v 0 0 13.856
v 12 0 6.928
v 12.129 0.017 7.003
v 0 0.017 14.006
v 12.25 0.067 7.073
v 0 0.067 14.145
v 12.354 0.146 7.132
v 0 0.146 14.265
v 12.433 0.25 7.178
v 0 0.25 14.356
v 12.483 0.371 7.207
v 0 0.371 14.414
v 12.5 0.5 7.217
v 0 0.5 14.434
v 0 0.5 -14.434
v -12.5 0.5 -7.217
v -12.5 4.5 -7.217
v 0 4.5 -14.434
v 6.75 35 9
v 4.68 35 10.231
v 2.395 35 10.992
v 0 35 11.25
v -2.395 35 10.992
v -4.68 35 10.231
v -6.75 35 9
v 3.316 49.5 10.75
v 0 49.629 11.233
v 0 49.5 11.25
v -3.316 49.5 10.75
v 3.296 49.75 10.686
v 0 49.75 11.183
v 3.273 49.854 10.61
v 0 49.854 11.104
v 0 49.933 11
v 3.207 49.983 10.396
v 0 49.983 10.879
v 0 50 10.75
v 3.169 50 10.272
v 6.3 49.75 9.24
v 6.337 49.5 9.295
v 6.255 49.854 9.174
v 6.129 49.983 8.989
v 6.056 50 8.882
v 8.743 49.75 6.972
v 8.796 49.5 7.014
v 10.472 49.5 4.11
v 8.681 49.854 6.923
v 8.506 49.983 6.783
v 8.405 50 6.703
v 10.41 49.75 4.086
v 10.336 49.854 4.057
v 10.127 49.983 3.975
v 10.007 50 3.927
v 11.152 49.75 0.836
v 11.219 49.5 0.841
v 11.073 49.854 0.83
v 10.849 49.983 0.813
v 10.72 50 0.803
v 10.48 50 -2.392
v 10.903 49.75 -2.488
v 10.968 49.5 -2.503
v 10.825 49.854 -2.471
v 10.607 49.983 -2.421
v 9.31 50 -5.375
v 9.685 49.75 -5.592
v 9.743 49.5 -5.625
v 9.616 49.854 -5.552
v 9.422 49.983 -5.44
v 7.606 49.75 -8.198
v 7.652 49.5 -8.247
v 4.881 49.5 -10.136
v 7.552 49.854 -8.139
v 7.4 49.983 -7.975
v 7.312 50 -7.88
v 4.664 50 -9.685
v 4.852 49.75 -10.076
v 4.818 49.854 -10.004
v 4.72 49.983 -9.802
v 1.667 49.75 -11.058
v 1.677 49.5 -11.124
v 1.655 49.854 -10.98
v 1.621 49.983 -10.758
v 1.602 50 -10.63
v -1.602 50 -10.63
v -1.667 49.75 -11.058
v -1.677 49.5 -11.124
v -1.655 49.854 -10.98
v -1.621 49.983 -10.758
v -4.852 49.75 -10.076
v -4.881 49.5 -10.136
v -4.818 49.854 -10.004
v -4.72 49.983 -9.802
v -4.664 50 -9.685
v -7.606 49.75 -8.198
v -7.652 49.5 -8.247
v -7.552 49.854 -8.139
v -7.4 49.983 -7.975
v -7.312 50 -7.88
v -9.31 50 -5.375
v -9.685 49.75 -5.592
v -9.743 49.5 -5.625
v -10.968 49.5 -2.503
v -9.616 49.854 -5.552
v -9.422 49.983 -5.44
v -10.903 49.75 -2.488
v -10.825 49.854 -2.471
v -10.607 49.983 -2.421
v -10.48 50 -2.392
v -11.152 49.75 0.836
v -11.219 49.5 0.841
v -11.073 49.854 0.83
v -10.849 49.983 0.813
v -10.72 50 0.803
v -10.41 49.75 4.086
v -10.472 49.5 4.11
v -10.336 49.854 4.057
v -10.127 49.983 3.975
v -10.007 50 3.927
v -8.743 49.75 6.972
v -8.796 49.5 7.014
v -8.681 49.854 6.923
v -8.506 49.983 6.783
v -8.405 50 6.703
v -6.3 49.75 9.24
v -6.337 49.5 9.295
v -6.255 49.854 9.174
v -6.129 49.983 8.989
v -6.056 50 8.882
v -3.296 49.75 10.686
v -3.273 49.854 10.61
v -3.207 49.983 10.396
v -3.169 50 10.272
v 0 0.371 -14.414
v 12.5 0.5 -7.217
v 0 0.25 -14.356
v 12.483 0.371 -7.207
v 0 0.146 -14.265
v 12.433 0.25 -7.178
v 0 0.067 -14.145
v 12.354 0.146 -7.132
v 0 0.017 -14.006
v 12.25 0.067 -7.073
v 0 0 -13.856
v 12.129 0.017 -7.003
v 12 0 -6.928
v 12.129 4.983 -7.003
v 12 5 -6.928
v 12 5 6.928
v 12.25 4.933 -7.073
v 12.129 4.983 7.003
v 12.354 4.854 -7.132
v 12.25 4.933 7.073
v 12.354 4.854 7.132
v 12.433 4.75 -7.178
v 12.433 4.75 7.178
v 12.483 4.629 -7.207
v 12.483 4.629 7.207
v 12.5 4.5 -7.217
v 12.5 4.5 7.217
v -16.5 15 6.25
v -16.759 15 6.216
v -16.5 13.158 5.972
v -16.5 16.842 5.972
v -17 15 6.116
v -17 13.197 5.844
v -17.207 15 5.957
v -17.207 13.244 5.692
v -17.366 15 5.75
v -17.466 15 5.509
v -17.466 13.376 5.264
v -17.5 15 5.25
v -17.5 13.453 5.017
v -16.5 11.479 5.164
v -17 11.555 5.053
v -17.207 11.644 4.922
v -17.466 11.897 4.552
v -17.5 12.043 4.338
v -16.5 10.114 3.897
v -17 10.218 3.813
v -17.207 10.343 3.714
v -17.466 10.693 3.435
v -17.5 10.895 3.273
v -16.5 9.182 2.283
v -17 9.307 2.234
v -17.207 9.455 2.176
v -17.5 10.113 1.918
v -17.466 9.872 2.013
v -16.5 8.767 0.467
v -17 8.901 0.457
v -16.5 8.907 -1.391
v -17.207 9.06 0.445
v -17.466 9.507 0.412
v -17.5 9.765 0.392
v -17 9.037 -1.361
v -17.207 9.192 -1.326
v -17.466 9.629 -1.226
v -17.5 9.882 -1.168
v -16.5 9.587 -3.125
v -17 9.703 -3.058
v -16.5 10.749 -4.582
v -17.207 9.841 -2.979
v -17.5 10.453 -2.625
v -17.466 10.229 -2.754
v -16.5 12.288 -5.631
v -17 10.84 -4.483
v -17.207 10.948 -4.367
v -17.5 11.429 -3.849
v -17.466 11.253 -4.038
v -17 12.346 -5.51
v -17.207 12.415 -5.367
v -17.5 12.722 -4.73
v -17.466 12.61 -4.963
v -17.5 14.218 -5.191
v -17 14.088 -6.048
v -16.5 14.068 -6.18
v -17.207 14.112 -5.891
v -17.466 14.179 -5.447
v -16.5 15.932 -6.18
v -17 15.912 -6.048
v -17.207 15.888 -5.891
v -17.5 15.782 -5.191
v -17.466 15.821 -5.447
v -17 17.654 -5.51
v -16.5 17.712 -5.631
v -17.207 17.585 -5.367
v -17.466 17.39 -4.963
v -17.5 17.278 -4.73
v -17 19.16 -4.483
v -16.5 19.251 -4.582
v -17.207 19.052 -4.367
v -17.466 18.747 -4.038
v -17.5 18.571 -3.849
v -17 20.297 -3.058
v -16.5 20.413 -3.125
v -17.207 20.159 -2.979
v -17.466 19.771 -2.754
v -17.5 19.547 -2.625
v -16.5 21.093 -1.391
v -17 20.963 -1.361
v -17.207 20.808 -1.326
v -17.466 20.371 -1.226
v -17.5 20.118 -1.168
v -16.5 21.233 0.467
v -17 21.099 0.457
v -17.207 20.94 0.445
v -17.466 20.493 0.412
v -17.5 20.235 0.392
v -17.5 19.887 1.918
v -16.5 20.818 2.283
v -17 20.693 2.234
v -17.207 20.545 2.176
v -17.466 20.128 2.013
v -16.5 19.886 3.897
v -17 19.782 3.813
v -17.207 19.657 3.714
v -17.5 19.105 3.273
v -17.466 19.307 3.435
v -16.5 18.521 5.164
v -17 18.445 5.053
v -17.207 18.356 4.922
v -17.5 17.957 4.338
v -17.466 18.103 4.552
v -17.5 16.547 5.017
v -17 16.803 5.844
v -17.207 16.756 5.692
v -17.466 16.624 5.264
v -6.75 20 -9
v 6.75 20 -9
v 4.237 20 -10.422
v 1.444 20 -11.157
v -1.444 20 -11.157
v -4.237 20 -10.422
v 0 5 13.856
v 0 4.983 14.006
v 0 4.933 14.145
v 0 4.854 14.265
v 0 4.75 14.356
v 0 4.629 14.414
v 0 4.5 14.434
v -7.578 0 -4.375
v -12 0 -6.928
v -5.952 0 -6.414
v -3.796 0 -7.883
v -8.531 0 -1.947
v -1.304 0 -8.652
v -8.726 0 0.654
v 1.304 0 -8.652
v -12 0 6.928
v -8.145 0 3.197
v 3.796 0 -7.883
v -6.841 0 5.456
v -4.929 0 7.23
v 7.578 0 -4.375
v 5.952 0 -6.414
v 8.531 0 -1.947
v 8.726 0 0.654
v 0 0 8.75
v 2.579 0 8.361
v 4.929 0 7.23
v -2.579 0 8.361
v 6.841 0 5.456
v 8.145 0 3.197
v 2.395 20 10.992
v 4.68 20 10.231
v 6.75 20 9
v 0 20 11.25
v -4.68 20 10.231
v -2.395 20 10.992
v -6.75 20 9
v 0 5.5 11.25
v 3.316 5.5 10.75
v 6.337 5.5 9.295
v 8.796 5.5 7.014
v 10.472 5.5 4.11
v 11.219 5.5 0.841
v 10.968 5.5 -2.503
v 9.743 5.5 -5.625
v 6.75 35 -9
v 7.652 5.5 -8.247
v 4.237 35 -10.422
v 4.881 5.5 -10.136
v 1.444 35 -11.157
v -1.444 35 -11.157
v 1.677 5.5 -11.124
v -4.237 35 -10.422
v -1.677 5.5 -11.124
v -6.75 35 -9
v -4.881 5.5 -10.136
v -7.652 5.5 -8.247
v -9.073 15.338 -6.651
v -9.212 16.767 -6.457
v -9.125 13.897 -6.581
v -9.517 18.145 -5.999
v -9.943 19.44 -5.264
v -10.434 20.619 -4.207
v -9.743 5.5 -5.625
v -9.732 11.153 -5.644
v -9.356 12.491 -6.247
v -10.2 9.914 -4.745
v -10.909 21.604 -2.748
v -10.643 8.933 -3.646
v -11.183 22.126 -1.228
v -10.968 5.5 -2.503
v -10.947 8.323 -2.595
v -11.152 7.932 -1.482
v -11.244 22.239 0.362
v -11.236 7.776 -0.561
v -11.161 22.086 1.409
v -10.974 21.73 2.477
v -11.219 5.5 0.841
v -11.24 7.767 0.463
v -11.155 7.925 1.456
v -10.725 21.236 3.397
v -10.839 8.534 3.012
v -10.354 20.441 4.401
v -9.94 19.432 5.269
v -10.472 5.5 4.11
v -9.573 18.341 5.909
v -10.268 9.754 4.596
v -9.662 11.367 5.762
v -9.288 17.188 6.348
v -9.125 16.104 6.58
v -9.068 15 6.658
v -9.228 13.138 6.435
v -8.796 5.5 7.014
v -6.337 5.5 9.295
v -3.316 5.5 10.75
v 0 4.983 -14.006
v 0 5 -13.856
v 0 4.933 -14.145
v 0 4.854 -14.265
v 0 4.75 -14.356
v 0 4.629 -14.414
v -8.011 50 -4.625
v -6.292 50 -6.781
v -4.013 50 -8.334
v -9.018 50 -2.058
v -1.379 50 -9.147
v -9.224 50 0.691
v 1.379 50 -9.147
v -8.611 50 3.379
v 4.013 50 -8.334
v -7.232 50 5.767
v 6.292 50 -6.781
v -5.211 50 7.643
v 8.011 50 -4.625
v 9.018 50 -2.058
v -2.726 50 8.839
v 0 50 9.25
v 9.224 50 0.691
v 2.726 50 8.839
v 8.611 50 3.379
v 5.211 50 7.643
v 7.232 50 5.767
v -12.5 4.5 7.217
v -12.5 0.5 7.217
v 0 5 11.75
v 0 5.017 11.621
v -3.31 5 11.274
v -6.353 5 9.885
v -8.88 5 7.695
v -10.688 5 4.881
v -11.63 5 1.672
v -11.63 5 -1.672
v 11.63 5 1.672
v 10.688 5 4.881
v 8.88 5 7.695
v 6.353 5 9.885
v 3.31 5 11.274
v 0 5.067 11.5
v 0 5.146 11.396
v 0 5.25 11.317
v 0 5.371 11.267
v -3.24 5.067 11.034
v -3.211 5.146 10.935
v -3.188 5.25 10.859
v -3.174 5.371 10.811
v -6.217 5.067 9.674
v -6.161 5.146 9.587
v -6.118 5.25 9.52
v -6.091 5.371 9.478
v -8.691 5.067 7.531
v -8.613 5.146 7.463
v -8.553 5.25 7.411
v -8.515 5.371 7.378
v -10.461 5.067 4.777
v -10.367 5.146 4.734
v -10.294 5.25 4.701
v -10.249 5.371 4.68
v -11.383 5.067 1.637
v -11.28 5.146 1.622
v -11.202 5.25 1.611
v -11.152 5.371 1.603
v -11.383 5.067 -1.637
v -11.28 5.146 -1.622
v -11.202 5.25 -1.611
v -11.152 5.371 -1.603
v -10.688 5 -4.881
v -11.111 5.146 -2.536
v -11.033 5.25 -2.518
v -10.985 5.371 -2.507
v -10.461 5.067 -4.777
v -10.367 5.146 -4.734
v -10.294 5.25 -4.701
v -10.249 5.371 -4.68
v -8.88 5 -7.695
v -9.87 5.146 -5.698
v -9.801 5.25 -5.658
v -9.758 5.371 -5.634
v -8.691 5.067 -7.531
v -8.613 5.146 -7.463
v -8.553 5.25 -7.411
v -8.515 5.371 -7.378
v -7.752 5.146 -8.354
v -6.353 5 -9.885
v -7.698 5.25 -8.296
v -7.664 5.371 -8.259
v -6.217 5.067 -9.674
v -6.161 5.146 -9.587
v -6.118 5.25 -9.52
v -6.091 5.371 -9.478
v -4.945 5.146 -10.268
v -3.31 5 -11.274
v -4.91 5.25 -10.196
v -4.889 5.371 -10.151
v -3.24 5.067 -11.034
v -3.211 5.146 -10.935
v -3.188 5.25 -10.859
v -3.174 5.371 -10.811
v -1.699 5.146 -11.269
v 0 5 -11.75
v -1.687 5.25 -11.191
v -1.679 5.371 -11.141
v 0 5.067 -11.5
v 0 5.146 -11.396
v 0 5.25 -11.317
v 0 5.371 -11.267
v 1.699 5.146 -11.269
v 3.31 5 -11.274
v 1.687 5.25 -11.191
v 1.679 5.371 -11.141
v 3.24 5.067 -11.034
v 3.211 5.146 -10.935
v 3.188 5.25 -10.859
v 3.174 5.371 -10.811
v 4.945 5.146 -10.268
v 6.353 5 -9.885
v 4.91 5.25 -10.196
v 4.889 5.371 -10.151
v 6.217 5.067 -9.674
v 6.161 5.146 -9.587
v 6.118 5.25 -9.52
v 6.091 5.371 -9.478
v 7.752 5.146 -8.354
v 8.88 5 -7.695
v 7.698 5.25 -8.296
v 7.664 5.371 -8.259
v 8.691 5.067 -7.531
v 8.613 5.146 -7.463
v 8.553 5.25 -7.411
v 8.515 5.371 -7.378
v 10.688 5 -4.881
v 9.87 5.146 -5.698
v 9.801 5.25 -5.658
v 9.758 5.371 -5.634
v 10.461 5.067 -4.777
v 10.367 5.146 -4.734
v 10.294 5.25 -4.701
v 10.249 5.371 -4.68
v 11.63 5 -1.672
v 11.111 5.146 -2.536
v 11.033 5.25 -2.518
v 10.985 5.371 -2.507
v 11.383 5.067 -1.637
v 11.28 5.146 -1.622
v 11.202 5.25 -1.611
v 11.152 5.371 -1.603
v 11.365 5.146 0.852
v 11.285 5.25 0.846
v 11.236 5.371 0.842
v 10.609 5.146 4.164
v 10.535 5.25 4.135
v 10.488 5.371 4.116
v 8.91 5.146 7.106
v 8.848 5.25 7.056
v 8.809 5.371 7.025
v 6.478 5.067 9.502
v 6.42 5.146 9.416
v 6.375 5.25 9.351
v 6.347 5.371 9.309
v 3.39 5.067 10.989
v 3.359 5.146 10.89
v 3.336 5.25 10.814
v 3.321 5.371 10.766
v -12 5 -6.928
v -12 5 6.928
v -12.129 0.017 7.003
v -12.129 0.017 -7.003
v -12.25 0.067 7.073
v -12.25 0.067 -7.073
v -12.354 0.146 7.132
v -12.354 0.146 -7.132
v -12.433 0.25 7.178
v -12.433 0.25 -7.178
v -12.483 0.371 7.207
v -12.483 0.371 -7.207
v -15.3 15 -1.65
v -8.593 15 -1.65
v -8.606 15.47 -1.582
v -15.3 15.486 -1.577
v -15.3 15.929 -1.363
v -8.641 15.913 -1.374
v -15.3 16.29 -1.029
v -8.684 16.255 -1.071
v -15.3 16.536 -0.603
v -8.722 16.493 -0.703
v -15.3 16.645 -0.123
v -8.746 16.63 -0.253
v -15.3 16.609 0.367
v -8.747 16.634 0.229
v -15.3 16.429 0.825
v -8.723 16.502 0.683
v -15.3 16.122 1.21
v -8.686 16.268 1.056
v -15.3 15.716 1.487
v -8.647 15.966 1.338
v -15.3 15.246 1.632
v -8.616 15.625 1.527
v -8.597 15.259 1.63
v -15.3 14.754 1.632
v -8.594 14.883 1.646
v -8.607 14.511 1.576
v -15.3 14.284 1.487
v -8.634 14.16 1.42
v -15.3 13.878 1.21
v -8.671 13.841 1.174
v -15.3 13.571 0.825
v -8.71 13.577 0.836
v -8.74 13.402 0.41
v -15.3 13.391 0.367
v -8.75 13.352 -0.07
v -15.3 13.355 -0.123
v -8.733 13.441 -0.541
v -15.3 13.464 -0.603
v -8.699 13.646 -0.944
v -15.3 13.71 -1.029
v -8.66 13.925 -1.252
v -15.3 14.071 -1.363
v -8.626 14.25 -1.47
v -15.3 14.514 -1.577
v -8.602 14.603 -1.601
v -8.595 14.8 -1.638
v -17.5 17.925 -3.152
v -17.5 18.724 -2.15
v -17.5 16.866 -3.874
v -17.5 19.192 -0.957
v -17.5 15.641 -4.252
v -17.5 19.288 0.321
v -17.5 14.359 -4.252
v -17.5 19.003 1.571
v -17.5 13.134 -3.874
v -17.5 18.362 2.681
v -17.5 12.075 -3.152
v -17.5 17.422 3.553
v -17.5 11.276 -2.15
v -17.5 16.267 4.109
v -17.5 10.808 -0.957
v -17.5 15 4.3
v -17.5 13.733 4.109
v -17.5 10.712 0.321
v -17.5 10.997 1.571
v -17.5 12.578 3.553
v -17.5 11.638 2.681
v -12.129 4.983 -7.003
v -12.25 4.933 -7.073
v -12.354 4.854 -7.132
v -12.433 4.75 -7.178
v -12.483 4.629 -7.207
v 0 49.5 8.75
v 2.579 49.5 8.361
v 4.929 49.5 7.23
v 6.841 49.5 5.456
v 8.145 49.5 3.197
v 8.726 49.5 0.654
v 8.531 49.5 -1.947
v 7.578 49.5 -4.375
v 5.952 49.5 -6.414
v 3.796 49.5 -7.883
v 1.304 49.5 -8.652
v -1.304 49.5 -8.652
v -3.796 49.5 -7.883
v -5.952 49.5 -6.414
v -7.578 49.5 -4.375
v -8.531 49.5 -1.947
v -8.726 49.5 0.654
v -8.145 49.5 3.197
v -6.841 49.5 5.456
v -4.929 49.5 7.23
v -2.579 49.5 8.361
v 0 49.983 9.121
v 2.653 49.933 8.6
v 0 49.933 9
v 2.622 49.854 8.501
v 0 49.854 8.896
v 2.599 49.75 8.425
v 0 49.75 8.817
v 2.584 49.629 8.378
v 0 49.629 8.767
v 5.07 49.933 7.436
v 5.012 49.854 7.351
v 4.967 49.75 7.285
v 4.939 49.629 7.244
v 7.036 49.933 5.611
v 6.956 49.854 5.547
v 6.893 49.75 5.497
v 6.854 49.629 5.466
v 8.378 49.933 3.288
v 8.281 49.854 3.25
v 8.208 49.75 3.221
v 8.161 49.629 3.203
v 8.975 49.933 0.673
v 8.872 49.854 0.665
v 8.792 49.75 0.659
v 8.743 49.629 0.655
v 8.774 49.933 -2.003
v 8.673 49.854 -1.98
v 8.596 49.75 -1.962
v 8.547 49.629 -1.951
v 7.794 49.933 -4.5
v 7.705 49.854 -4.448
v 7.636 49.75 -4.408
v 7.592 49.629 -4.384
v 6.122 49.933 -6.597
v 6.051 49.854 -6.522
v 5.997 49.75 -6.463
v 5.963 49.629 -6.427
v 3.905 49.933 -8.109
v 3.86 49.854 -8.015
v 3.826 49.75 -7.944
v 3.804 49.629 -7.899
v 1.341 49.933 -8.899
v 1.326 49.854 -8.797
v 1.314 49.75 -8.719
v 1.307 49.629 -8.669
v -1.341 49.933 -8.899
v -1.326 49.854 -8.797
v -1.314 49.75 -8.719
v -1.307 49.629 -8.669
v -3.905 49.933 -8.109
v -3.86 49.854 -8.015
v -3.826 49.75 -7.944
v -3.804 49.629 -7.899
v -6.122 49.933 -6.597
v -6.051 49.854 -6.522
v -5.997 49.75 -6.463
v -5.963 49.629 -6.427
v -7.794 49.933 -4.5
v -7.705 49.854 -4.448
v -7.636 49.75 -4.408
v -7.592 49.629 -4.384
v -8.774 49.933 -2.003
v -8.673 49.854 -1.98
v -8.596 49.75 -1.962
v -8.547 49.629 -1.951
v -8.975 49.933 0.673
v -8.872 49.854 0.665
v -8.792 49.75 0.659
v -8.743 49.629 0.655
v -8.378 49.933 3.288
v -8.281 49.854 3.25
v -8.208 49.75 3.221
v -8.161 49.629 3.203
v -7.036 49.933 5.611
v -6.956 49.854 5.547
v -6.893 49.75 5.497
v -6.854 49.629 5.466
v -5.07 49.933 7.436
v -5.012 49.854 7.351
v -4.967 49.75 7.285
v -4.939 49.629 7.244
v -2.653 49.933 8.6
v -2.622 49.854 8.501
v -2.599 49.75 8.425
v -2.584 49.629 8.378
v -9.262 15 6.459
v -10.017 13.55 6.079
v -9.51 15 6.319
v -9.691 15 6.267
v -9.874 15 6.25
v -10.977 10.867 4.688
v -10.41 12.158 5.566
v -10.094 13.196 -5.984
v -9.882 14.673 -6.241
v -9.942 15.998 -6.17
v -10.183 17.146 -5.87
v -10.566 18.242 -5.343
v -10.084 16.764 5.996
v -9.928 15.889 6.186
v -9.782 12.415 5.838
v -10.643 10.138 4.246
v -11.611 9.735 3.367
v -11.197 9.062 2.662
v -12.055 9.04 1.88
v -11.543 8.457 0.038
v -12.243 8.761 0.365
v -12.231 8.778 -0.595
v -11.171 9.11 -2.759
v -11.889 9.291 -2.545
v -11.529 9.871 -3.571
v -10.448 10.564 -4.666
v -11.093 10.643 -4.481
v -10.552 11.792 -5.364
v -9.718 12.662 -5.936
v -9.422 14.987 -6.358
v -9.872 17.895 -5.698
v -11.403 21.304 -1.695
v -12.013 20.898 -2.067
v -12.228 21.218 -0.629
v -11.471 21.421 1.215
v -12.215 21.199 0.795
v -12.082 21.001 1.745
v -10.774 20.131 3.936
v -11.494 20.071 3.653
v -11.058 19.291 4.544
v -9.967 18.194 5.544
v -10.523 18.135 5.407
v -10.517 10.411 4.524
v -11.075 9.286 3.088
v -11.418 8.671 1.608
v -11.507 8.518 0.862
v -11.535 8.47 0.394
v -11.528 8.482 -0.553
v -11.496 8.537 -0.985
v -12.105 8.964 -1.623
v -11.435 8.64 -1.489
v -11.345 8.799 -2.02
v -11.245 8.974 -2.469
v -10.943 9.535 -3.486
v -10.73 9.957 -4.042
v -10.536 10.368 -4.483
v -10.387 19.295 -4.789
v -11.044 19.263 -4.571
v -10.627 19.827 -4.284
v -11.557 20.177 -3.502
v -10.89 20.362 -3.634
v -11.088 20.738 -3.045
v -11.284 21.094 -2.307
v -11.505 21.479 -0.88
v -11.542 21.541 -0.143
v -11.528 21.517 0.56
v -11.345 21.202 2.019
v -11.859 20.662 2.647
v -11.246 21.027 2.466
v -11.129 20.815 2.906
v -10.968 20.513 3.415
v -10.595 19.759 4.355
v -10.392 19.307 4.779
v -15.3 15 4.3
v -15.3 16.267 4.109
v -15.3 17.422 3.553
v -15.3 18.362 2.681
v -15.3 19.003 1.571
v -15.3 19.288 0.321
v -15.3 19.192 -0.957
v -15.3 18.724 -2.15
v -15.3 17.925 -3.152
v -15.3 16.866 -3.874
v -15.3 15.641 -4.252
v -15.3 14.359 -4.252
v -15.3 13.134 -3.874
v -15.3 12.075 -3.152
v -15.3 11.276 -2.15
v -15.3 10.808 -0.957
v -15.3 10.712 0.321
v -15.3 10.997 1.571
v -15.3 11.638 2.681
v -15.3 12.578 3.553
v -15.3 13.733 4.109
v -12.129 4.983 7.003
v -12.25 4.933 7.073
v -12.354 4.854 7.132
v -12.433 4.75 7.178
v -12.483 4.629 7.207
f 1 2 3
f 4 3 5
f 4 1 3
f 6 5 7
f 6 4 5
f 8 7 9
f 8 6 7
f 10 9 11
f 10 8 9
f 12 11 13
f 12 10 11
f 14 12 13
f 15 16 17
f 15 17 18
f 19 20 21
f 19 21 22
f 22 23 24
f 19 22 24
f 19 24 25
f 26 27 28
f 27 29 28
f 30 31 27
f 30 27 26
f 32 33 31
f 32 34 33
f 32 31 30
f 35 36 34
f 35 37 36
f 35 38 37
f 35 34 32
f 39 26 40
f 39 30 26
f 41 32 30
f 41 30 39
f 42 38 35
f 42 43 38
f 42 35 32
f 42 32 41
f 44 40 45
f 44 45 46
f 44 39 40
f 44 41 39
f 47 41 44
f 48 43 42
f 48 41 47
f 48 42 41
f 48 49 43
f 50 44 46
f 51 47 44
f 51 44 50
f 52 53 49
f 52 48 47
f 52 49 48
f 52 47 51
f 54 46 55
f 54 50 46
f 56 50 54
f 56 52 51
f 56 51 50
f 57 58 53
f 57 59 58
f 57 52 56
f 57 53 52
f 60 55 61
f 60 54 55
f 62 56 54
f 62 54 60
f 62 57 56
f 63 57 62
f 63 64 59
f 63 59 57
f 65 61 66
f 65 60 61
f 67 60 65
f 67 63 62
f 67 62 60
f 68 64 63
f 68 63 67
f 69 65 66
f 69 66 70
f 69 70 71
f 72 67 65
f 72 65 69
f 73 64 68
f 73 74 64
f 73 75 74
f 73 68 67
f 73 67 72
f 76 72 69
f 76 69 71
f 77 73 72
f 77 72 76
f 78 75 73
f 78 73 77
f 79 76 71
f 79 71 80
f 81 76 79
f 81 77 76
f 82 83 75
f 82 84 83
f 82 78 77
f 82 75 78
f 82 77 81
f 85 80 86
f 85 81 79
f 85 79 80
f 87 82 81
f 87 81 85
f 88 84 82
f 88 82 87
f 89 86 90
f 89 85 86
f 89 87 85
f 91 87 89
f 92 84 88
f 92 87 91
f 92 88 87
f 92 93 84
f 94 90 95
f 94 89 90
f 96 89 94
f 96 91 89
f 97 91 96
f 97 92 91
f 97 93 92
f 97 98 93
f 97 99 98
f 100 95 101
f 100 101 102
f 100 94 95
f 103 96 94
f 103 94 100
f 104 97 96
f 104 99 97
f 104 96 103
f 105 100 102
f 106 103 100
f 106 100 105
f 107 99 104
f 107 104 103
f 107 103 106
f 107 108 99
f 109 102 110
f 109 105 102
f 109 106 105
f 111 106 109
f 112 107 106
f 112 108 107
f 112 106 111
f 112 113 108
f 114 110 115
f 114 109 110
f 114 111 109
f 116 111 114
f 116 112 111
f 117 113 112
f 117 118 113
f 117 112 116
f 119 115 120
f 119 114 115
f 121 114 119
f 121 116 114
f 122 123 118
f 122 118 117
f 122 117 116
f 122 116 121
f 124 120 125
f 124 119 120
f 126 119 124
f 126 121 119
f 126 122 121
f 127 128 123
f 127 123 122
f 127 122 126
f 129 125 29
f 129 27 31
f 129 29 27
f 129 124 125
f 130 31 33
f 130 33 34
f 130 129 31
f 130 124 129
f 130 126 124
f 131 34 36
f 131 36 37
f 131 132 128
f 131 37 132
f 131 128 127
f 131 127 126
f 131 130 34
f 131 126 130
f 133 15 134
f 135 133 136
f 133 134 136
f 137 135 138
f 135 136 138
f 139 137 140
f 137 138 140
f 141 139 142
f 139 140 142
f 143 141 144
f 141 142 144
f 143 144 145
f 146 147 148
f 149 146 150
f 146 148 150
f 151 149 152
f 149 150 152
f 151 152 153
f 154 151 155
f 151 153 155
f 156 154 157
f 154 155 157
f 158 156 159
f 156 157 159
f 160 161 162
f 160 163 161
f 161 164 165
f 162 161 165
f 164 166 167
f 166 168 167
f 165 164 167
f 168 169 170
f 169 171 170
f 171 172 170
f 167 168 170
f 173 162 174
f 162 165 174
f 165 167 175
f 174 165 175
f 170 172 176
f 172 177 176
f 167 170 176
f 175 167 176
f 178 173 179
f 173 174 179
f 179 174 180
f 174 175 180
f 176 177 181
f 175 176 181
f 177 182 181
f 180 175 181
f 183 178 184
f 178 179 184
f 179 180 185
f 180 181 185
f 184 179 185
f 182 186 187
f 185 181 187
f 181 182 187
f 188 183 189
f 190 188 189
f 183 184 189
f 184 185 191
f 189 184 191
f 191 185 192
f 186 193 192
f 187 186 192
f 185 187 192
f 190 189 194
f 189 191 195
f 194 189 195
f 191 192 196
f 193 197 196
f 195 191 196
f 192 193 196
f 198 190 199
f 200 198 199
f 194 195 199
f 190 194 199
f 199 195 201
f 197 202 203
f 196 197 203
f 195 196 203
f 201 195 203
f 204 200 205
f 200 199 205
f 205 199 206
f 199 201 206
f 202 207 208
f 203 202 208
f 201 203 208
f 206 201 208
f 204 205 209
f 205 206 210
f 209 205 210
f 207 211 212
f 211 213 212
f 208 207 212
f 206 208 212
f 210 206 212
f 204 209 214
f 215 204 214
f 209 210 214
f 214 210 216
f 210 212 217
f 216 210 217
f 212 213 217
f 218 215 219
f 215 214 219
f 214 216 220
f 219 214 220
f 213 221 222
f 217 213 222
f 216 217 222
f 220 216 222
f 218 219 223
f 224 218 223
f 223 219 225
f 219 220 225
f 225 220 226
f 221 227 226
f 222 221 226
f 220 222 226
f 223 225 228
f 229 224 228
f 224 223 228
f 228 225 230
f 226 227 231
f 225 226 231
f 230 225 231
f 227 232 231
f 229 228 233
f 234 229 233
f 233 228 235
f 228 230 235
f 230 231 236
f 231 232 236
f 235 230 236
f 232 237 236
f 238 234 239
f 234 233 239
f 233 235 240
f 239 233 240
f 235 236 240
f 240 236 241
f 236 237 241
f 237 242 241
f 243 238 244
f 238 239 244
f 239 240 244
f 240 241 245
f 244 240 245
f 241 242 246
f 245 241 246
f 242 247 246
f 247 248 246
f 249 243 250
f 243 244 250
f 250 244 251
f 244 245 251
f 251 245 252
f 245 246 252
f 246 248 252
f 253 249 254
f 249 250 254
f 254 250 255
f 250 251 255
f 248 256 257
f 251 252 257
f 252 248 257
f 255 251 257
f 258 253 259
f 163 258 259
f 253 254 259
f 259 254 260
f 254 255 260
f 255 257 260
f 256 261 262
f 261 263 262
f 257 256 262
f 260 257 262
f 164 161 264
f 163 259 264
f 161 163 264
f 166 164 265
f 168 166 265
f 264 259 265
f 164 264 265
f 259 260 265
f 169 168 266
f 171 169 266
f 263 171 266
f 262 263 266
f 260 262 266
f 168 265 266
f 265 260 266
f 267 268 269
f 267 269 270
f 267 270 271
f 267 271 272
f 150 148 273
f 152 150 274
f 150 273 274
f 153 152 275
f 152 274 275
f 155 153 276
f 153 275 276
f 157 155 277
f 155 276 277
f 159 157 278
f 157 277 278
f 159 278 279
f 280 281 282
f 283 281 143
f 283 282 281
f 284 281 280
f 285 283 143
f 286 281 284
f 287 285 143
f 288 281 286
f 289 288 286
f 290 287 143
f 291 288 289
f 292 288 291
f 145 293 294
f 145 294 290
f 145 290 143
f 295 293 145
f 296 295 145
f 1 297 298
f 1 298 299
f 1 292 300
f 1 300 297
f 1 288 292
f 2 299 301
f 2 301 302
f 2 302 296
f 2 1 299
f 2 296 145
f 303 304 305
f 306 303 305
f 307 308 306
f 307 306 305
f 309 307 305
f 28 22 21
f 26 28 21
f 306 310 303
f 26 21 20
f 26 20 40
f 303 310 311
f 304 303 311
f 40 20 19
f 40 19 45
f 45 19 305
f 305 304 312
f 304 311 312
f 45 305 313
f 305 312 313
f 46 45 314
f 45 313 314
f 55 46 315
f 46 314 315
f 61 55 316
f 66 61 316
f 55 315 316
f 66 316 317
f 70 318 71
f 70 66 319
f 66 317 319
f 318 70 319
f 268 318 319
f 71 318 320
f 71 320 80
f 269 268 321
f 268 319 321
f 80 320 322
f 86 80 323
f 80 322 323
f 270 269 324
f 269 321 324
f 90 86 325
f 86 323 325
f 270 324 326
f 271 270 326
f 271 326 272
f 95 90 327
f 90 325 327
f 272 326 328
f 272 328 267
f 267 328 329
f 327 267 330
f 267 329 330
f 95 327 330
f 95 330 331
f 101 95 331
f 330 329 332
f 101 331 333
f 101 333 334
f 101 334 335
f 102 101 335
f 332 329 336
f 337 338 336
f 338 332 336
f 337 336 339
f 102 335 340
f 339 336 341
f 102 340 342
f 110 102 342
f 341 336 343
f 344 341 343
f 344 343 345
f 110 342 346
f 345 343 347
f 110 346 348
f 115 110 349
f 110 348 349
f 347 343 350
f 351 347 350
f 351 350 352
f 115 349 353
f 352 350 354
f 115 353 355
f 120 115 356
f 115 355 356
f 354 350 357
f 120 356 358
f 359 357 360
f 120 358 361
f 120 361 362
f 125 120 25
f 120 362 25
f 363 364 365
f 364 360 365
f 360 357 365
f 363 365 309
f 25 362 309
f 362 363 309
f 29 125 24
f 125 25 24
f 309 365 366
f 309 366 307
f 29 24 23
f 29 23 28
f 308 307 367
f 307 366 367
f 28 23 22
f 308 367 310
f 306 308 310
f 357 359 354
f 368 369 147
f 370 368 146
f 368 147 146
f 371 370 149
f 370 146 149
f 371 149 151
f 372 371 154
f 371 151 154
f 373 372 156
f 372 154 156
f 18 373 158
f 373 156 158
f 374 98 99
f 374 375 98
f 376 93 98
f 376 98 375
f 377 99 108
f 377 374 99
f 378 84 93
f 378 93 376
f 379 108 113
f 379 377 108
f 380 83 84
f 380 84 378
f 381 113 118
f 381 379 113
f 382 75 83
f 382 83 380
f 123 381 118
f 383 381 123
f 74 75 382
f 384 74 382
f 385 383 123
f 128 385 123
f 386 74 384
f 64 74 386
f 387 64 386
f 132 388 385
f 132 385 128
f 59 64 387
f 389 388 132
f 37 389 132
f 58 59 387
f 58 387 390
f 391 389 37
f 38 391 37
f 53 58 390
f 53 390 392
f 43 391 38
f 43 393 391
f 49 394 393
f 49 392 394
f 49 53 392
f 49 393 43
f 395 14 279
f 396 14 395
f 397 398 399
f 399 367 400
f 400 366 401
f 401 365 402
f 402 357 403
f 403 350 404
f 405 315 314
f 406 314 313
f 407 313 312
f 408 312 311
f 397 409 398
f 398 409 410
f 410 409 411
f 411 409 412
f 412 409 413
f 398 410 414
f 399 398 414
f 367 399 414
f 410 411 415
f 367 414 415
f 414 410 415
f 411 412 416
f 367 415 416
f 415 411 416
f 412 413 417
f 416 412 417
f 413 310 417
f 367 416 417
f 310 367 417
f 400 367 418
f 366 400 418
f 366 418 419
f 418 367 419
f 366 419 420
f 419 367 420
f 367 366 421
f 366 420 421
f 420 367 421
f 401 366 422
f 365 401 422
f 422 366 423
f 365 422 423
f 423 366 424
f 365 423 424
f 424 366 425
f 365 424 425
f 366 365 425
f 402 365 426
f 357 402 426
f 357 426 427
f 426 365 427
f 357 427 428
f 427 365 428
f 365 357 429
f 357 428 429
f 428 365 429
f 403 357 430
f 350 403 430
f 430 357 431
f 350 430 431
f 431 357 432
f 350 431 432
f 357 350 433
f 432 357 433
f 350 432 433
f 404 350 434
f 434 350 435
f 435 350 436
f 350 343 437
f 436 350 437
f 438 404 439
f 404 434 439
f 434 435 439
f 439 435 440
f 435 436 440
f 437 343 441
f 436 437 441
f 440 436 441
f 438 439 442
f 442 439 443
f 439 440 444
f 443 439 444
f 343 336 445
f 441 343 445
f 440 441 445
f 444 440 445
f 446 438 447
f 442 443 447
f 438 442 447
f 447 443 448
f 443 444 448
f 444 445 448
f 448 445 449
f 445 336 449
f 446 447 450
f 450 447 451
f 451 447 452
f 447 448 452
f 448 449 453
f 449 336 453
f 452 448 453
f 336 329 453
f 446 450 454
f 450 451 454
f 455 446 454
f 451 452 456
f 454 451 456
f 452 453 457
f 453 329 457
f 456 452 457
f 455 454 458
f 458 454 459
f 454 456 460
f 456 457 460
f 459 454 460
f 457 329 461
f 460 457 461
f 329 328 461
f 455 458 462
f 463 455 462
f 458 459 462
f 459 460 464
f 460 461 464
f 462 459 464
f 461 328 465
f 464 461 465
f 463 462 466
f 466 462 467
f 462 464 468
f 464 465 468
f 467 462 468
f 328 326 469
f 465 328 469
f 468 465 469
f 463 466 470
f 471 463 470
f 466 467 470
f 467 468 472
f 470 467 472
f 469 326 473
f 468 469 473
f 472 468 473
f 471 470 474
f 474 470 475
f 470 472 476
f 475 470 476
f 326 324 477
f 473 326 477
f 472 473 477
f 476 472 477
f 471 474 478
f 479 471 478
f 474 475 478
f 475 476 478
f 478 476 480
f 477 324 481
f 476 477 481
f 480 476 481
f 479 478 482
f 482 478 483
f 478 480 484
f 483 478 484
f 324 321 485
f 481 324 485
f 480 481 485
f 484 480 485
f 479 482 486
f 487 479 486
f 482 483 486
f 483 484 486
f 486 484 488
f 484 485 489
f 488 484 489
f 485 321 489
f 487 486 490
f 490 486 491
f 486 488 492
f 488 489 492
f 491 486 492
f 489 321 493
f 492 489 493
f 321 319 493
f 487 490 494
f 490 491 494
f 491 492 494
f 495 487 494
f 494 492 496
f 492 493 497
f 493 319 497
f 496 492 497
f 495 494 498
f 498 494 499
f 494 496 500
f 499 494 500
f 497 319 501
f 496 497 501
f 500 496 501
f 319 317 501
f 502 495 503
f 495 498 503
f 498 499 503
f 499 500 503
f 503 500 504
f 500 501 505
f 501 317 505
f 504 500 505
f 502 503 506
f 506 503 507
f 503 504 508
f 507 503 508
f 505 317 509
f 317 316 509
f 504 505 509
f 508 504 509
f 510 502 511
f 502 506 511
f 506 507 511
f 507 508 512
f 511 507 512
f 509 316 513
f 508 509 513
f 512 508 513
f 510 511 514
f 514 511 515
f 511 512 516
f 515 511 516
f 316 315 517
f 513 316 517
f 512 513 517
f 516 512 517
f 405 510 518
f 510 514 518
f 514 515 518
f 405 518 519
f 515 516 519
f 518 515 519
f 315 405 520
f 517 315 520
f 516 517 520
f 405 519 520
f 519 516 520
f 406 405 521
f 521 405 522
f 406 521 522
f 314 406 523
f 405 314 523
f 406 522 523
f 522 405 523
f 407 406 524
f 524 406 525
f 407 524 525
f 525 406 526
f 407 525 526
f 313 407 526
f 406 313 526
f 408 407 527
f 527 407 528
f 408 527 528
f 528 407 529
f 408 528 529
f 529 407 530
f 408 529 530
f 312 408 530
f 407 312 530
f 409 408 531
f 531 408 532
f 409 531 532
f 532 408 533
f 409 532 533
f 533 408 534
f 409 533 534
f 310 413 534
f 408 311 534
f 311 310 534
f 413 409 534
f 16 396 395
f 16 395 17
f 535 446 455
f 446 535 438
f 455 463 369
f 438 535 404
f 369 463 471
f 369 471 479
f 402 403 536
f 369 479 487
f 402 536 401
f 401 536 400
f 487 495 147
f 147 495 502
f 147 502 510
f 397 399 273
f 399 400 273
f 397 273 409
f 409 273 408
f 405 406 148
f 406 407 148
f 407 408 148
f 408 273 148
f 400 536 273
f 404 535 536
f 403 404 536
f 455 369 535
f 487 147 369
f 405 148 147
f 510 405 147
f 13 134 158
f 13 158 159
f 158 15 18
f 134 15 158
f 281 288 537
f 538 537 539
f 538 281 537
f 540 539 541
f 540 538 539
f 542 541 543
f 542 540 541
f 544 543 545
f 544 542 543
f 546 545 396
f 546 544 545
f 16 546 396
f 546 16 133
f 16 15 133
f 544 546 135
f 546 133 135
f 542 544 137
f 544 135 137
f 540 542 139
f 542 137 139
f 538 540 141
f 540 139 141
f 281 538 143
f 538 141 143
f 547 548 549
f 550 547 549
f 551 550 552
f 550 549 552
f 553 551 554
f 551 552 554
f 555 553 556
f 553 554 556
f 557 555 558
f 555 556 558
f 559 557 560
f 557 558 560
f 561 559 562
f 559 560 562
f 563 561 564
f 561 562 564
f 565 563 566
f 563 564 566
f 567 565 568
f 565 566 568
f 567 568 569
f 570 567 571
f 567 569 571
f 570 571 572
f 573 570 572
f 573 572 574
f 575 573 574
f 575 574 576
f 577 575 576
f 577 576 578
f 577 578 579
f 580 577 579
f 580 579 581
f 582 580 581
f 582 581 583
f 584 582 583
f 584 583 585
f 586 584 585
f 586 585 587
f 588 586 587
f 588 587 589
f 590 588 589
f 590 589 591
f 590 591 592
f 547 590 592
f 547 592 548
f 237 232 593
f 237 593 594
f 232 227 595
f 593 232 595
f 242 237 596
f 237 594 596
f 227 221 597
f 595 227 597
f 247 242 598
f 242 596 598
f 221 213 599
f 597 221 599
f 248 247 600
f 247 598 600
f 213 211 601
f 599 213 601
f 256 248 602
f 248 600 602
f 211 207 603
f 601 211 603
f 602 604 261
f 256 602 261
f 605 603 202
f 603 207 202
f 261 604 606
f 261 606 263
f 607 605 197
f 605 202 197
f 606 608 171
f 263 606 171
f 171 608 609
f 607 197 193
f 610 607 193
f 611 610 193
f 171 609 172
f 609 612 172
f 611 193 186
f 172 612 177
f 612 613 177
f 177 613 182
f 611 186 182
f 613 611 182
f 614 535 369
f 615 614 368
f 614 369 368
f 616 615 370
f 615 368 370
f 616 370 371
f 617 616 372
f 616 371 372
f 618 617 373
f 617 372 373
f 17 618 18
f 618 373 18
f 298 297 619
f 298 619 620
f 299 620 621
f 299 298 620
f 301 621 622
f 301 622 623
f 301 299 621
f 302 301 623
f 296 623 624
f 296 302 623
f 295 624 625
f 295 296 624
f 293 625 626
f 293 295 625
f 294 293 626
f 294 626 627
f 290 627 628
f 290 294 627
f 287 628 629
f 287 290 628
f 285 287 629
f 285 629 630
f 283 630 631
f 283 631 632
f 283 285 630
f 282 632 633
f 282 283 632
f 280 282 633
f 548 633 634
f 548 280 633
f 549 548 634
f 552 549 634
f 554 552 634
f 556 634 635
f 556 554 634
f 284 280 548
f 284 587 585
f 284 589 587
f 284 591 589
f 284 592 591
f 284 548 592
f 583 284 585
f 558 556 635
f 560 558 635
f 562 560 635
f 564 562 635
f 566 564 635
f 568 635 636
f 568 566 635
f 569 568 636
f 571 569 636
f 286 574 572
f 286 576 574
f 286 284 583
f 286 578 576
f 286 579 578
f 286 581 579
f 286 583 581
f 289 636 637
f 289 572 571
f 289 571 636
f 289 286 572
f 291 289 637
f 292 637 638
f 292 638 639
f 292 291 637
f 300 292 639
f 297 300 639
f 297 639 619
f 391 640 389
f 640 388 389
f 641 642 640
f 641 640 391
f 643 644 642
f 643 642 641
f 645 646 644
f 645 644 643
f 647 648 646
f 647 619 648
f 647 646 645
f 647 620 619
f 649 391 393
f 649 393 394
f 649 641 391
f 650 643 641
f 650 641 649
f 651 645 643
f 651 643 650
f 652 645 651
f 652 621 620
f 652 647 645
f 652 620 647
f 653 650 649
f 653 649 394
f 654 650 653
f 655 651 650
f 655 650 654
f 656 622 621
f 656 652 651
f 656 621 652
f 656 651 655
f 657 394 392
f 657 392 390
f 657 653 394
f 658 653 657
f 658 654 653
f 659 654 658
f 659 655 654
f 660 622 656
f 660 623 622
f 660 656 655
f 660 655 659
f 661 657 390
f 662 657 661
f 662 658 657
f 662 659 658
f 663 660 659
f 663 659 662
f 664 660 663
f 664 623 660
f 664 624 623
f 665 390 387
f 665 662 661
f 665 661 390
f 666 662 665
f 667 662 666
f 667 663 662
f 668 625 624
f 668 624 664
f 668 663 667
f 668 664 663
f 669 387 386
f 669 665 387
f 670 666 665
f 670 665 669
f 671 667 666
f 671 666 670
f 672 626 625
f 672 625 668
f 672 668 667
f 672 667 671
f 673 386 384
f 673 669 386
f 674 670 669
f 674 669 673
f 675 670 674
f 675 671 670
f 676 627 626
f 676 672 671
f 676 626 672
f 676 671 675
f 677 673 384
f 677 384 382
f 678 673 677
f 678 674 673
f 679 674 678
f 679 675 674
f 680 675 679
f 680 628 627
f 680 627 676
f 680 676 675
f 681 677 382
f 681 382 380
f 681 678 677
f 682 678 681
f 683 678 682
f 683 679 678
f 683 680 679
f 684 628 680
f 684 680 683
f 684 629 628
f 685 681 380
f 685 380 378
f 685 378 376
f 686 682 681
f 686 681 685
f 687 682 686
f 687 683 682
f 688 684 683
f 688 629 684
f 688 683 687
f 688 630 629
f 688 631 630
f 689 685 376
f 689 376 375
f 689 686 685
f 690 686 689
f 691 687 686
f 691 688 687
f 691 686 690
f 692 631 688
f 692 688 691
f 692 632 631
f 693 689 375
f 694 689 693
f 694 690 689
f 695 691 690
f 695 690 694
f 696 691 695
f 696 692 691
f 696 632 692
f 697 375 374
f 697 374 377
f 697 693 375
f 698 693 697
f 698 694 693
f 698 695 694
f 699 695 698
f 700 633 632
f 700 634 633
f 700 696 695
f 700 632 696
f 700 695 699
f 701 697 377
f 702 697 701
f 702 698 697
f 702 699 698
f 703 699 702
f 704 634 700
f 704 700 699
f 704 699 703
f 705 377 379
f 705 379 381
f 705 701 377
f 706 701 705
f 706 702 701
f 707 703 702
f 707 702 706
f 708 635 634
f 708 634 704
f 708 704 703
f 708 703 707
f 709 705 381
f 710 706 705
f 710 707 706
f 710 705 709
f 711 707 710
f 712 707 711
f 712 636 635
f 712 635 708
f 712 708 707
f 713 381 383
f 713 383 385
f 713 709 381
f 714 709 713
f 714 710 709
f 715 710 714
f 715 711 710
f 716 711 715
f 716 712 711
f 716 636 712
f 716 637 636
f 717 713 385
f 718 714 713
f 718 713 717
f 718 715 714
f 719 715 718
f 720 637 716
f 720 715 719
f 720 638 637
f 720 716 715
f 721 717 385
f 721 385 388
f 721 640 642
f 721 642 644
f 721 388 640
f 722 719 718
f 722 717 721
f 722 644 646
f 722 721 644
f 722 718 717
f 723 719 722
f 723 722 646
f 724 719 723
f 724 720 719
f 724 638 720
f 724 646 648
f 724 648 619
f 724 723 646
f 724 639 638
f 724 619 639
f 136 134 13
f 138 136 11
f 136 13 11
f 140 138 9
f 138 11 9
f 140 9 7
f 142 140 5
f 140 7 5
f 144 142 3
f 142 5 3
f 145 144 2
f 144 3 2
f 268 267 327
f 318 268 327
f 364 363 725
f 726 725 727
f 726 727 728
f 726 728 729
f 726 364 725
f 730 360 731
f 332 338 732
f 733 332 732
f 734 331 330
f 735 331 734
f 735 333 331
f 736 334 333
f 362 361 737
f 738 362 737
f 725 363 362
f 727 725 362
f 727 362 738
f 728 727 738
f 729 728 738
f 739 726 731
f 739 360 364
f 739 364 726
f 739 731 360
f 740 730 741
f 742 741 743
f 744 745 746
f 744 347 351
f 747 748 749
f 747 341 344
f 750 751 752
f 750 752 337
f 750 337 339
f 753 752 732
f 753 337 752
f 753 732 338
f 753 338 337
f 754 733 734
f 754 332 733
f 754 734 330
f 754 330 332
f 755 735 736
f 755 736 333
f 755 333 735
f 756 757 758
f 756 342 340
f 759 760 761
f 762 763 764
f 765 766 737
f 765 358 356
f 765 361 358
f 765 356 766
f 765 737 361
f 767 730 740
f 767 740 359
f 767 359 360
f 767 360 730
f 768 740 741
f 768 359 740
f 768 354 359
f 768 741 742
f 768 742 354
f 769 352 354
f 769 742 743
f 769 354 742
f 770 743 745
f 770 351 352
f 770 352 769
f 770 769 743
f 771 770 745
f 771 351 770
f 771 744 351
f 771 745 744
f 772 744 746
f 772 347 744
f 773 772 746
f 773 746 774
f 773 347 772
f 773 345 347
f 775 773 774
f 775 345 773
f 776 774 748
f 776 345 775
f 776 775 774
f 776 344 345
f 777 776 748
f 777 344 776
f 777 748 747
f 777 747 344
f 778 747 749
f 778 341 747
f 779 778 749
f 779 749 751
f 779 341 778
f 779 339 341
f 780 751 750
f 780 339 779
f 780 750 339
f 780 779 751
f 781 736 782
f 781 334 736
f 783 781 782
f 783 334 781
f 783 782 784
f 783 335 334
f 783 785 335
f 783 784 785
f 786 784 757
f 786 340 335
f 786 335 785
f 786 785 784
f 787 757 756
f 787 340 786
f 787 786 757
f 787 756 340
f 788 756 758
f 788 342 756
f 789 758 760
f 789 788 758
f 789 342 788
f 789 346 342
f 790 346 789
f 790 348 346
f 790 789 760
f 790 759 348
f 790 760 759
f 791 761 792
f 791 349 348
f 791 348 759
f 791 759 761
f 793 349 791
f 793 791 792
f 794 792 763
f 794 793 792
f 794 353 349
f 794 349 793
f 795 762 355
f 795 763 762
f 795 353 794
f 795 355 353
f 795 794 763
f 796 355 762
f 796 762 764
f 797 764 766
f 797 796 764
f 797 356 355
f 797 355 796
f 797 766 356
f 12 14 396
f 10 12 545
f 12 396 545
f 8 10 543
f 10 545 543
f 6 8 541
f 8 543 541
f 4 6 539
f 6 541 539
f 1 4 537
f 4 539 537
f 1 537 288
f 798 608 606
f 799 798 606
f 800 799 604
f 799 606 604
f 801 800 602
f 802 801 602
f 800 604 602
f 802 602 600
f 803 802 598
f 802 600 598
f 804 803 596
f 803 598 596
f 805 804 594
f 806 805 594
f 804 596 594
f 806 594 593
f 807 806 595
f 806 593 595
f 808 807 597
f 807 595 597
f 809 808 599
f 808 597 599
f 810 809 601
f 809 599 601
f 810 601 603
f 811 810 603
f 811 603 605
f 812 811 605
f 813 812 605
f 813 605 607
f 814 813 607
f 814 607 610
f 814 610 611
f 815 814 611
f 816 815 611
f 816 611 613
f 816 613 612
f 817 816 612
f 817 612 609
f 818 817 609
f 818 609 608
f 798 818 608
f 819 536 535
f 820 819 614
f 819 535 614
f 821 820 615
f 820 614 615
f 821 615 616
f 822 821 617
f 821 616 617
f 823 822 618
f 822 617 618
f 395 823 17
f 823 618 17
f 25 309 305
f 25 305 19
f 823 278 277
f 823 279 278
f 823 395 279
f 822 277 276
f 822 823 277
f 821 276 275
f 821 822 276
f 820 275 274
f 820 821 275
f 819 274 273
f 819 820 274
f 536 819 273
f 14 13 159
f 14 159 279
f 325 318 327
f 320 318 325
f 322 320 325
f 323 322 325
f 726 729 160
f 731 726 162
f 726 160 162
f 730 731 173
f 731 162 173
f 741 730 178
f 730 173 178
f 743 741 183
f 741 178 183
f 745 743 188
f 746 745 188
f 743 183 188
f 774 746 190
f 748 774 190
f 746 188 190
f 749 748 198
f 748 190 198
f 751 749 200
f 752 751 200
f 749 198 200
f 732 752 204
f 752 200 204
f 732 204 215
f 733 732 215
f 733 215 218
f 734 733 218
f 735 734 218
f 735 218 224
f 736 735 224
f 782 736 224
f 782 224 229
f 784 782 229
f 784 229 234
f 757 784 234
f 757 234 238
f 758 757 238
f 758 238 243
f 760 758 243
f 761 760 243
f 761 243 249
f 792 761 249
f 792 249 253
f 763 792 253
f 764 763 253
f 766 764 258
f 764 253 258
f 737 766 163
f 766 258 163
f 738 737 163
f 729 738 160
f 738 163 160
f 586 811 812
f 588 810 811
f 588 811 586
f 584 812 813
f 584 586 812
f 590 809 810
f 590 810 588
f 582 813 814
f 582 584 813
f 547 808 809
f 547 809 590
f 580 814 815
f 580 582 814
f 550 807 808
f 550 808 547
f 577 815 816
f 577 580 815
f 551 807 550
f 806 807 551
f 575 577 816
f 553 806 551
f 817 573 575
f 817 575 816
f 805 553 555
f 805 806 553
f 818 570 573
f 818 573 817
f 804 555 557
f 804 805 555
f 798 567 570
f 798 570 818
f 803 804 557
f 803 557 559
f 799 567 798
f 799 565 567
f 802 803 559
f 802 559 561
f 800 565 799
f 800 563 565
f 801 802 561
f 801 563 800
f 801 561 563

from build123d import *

# Parameters (mm, degrees)
SKETCH5_R                       = 11.25
SKETCH5_R_2                     = 8.75
BOSS_EXTRUDE3_DEPTH             = 50
SKETCH6_R                       = 8.75
BOSS_EXTRUDE4_DEPTH             = 5
FILLET1_R                       = 0.5
BOSS_EXTRUDE6_REACH             = 62.069
BOSS_EXTRUDE6_END_RADIUS        = 11.25
SKETCH16_R                      = 6.25
CBORE_FOR_M4_SBHCS1_D           = 3
CBORE_FOR_M4_SBHCS1_DEPTH       = 10
CBORE_FOR_M4_SBHCS1_CBORE_D     = 8.6
CBORE_FOR_M4_SBHCS1_CBORE_DEPTH = 2.2
CBORE_FOR_M4_SBHCS1_TIP         = 0.901290929
CUT_EXTRUDE1_DEPTH              = 55.90522149
CUT_EXTRUDE1_DEPTH_BACK         = 55.90522149
SKETCH11_W                      = 2.25
SKETCH11_H                      = 15
M4X0_7_TAPPED_HOLE1_D           = 3.3
M4X0_7_TAPPED_HOLE1_DEPTH       = 10.1
M4X0_7_TAPPED_HOLE1_TIP         = 0.991420021
FILLET3_R                       = 1


with BuildPart() as part:
    # Sketch5 → Boss-Extrude3 (new body)
    with BuildSketch(Plane(origin=(0, 0, 0), x_dir=(1, 0, 0), z_dir=(0, 1, 0))):
        with Locations(Location((0, 0, 0), (0, 0, 270))):
            Circle(SKETCH5_R)
        with Locations(Location((0, 0, 0), (0, 0, 270))):
            Circle(SKETCH5_R_2, mode=Mode.SUBTRACT)
    extrude(amount=BOSS_EXTRUDE3_DEPTH)

    # Sketch6 → Boss-Extrude4 (add)
    with BuildSketch(Plane.XZ):
        Polygon((0, 14.43375673), (-12.5, 7.216878365), (-12.5, -7.216878365), (0, -14.43375673), (12.5, -7.216878365), (12.5, 7.216878365), align=None)
        with Locations(Location((0, 0, 0), (0, 0, 90))):
            Circle(SKETCH6_R, mode=Mode.SUBTRACT)
    extrude(amount=-BOSS_EXTRUDE4_DEPTH)

    # Fillet1
    fillet1_edges = [part.edges().sort_by_distance(p)[0] for p in [
        (0, 5, -11.25),
        (6.25, 0, 10.825317547),
        (-6.25, 0, 10.825317547),
        (-12.5, 0, 0),
        (-6.25, 0, -10.825317547),
        (6.25, 0, -10.825317547),
        (12.5, 0, 0),
        (6.25, 5, 10.825317547),
        (12.5, 5, 0),
        (6.25, 5, -10.825317547),
        (-6.25, 5, -10.825317547),
        (-12.5, 5, 0),
        (-6.25, 5, 10.825317547),
        (0, 50, -11.25),
        (0, 50, -8.75),
    ]]
    fillet(fillet1_edges, radius=FILLET1_R)

    # Boss-Extrude6: up to this cylinder (the profile starts outside it)
    boss_extrude6_end = Plane(origin=(0, 15, 0), z_dir=(0, -1, 0)) * Cylinder(BOSS_EXTRUDE6_END_RADIUS, 147.638, mode=Mode.PRIVATE)
    # Sketch16 → Boss-Extrude6 (add, up to the surface)
    with BuildSketch(Plane(origin=(-17.5, 0, 0), x_dir=(0, 0, -1), z_dir=(1, 0, 0)), mode=Mode.PRIVATE) as boss_extrude6_sk1:
        with Locations(Location((0, 15, 0), (0, 0, 180))):
            Circle(SKETCH16_R)
    boss_extrude6_tool1 = extrude(boss_extrude6_sk1.sketch, amount=BOSS_EXTRUDE6_REACH, mode=Mode.PRIVATE) - boss_extrude6_end
    add(boss_extrude6_tool1.solids().sort_by_distance((-17.5, 15, 0))[0])

    # CBORE for M4 SBHCS1
    with Locations(Plane.ZY.offset(17.5)):
        with Locations((0, 15)):
            CounterBoreHole(CBORE_FOR_M4_SBHCS1_D / 2, CBORE_FOR_M4_SBHCS1_CBORE_D / 2, CBORE_FOR_M4_SBHCS1_CBORE_DEPTH, depth=CBORE_FOR_M4_SBHCS1_DEPTH)
            with Locations((0, 0, -(CBORE_FOR_M4_SBHCS1_DEPTH + CBORE_FOR_M4_SBHCS1_TIP / 2))):  # 118° drill point
                Cone(0, CBORE_FOR_M4_SBHCS1_D / 2, CBORE_FOR_M4_SBHCS1_TIP, mode=Mode.SUBTRACT)

    # Sketch11 → Cut-Extrude1 (cut, two sides: drawn at the far end of the back side and taken through both)
    with BuildSketch(Plane(origin=(0, 0, 0), x_dir=(0, 0, -1), z_dir=(1, 0, 0)).offset(-CUT_EXTRUDE1_DEPTH_BACK)):
        with Locations((-10.125, 27.5)):
            Rectangle(SKETCH11_W, SKETCH11_H)
        with Locations((10.125, 27.5)):
            Rectangle(SKETCH11_W, SKETCH11_H)
    extrude(amount=CUT_EXTRUDE1_DEPTH + CUT_EXTRUDE1_DEPTH_BACK, mode=Mode.SUBTRACT)

    # M4x0.7 Tapped Hole1
    with Locations(Plane.ZY.offset(15.3)):
        with Locations((0, 15)):
            Hole(M4X0_7_TAPPED_HOLE1_D / 2, depth=M4X0_7_TAPPED_HOLE1_DEPTH)
            with Locations((0, 0, -(M4X0_7_TAPPED_HOLE1_DEPTH + M4X0_7_TAPPED_HOLE1_TIP / 2))):  # 118° drill point
                Cone(0, M4X0_7_TAPPED_HOLE1_D / 2, M4X0_7_TAPPED_HOLE1_TIP, mode=Mode.SUBTRACT)

    # Fillet3
    fillet3_edges = [part.edges().sort_by_distance(p)[0] for p in [
        (-9.354143467, 15, -6.25),
        (-17.5, 15, -6.25),
    ]]
    fillet(fillet3_edges, radius=FILLET3_R)


solid = part.part
